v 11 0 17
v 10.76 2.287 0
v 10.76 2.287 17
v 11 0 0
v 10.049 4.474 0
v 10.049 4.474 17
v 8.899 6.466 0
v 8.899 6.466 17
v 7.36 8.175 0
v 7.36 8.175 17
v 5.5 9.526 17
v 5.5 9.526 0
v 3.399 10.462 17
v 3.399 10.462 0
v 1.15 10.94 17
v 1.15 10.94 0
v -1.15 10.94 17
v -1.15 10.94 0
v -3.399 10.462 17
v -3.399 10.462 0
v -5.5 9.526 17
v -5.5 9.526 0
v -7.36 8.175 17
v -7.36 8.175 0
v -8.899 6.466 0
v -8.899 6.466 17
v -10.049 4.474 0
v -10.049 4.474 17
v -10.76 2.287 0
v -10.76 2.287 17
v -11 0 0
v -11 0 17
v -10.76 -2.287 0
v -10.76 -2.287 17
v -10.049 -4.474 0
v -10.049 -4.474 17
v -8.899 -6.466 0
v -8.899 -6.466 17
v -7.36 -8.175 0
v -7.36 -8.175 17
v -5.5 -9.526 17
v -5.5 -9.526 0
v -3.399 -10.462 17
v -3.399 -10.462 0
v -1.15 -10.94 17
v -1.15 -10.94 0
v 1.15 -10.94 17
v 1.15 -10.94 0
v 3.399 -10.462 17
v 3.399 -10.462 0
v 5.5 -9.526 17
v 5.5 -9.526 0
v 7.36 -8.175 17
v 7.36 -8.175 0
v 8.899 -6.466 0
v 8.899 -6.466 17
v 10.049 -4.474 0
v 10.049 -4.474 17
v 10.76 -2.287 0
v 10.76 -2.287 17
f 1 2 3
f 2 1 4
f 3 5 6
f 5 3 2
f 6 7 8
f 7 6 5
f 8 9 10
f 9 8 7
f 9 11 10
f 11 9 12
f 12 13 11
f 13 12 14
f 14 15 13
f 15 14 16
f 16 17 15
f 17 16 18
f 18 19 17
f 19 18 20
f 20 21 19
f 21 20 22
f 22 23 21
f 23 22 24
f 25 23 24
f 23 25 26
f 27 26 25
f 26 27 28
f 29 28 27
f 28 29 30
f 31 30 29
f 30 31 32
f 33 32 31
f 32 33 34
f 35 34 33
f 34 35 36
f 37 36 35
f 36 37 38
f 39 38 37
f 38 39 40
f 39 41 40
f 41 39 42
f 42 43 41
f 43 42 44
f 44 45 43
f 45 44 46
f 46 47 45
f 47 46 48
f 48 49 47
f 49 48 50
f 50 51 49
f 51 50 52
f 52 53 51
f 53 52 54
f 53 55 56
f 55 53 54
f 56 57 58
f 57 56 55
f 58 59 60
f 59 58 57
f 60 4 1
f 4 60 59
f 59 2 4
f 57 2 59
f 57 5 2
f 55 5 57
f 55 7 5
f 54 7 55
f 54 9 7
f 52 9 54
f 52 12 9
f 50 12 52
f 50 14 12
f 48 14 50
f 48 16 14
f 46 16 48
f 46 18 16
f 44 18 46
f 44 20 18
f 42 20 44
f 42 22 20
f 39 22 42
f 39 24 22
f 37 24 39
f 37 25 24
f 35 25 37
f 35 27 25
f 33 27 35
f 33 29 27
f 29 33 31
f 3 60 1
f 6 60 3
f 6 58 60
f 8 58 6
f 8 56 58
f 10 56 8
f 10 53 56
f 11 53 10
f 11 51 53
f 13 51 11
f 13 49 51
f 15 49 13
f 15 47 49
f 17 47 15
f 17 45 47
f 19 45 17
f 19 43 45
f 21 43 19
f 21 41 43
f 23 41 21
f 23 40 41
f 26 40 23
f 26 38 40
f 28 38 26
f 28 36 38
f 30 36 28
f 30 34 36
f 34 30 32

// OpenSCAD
// Generated by SolidPython 1.0.1 on 2020-07-29 00:46:45


cylinder(h = 17, r1 = 11, r2 = 11);
/***********************************************
*********      SolidPython code:      **********
************************************************
 
# import packages: SolidPython
from solid import *
from solid.utils import *
from itertools import chain, combinations, permutations


class Resize:

    def __init__(self, scad_file):
        self.scad_file = scad_file
        #self.scad_file = import_scad(scad_file)
        # cone/cylinder param:
        self.r1 = 0
        self.r2 = 0
        self.h = 0
        # rectangular prism param:
        self.w = 0
        self.l = 0
        # ellipse param:
        self.r = 0

    # import OpenScad code (file name corresponds to shape)


    # classify shape + parameters
    def assign(self, param1, param2, param3):
        if self.scad_file == 'cone.scad':
            self.r1 = param1
            self.r2 = param2
            self.h = param3
        elif self.scad_file == 'cylinder.scad':
            self.r1 = param1
            self.r2 = param2
            self.h = param3
        elif self.scad_file == 'rectangularPrism.scad':
            self.h = param1
            self.l = param2
            self.w = param3
        else:
            self.r = param1
            self.h = param2

    # resize parameters
    def iterate(self):
        x = range(3, 20, 2)
        i = 1
        if self.scad_file == 'cone.scad':
            tempList = list(permutations(x, 2))
            for temp in tempList:
                param1 = temp[0]
                param2 = temp[1]
                filepath = 'produced_scad_files/' + 'cone' + str(param1) + '_' + str(param2) + '_' + '.scad'
                scad_render_to_file(cylinder(h=param1, r1=param2, r2=0), filepath)

        elif self.scad_file == 'cylinder.scad':
            tempList = list(permutations(x, 3))
            for temp in tempList:
                param1 = temp[0]
                param2 = temp[1]
                filepath = 'produced_scad_files/' + 'cylinder' + str(param1) + '_' + str(param2) + '_' + '.scad'
                scad_render_to_file(cylinder(h=param1, r1=param2, r2=param2), filepath)

        elif self.scad_file == 'rectangularPrism.scad':
            tempList = list(permutations(x, 3))
            for temp in tempList:
                param1 = temp[0]
                param2 = temp[1]
                param3 = temp[2]
                filepath = 'produced_scad_files/' + 'rectangularPrism' + str(param1) + '_' + str(param2) + '_' + str(
                    param3) + '.scad'
                scad_render_to_file(cube(size=(param1, param2, param3)), filepath)

        elif self.scad_file == 'ellipse.scad':
            tempList = list(permutations(x, 4))
            for temp in tempList:
                param1 = temp[0]
                param2 = temp[1]
                param3 = temp[2]
                param4 = temp[3]
                filepath = 'produced_scad_files/' + 'ellipse' + str(param1) + '_' + str(param2) + '_' + str(param3) + '_' + str(param4) + '.scad'
                scad_render_to_file(scale([param1, param2, param3])(sphere(r=param4)), filepath)

    def render_to_scadfile(self):
        scad_render_to_file(scad, 'example.scad') 
 
************************************************/
